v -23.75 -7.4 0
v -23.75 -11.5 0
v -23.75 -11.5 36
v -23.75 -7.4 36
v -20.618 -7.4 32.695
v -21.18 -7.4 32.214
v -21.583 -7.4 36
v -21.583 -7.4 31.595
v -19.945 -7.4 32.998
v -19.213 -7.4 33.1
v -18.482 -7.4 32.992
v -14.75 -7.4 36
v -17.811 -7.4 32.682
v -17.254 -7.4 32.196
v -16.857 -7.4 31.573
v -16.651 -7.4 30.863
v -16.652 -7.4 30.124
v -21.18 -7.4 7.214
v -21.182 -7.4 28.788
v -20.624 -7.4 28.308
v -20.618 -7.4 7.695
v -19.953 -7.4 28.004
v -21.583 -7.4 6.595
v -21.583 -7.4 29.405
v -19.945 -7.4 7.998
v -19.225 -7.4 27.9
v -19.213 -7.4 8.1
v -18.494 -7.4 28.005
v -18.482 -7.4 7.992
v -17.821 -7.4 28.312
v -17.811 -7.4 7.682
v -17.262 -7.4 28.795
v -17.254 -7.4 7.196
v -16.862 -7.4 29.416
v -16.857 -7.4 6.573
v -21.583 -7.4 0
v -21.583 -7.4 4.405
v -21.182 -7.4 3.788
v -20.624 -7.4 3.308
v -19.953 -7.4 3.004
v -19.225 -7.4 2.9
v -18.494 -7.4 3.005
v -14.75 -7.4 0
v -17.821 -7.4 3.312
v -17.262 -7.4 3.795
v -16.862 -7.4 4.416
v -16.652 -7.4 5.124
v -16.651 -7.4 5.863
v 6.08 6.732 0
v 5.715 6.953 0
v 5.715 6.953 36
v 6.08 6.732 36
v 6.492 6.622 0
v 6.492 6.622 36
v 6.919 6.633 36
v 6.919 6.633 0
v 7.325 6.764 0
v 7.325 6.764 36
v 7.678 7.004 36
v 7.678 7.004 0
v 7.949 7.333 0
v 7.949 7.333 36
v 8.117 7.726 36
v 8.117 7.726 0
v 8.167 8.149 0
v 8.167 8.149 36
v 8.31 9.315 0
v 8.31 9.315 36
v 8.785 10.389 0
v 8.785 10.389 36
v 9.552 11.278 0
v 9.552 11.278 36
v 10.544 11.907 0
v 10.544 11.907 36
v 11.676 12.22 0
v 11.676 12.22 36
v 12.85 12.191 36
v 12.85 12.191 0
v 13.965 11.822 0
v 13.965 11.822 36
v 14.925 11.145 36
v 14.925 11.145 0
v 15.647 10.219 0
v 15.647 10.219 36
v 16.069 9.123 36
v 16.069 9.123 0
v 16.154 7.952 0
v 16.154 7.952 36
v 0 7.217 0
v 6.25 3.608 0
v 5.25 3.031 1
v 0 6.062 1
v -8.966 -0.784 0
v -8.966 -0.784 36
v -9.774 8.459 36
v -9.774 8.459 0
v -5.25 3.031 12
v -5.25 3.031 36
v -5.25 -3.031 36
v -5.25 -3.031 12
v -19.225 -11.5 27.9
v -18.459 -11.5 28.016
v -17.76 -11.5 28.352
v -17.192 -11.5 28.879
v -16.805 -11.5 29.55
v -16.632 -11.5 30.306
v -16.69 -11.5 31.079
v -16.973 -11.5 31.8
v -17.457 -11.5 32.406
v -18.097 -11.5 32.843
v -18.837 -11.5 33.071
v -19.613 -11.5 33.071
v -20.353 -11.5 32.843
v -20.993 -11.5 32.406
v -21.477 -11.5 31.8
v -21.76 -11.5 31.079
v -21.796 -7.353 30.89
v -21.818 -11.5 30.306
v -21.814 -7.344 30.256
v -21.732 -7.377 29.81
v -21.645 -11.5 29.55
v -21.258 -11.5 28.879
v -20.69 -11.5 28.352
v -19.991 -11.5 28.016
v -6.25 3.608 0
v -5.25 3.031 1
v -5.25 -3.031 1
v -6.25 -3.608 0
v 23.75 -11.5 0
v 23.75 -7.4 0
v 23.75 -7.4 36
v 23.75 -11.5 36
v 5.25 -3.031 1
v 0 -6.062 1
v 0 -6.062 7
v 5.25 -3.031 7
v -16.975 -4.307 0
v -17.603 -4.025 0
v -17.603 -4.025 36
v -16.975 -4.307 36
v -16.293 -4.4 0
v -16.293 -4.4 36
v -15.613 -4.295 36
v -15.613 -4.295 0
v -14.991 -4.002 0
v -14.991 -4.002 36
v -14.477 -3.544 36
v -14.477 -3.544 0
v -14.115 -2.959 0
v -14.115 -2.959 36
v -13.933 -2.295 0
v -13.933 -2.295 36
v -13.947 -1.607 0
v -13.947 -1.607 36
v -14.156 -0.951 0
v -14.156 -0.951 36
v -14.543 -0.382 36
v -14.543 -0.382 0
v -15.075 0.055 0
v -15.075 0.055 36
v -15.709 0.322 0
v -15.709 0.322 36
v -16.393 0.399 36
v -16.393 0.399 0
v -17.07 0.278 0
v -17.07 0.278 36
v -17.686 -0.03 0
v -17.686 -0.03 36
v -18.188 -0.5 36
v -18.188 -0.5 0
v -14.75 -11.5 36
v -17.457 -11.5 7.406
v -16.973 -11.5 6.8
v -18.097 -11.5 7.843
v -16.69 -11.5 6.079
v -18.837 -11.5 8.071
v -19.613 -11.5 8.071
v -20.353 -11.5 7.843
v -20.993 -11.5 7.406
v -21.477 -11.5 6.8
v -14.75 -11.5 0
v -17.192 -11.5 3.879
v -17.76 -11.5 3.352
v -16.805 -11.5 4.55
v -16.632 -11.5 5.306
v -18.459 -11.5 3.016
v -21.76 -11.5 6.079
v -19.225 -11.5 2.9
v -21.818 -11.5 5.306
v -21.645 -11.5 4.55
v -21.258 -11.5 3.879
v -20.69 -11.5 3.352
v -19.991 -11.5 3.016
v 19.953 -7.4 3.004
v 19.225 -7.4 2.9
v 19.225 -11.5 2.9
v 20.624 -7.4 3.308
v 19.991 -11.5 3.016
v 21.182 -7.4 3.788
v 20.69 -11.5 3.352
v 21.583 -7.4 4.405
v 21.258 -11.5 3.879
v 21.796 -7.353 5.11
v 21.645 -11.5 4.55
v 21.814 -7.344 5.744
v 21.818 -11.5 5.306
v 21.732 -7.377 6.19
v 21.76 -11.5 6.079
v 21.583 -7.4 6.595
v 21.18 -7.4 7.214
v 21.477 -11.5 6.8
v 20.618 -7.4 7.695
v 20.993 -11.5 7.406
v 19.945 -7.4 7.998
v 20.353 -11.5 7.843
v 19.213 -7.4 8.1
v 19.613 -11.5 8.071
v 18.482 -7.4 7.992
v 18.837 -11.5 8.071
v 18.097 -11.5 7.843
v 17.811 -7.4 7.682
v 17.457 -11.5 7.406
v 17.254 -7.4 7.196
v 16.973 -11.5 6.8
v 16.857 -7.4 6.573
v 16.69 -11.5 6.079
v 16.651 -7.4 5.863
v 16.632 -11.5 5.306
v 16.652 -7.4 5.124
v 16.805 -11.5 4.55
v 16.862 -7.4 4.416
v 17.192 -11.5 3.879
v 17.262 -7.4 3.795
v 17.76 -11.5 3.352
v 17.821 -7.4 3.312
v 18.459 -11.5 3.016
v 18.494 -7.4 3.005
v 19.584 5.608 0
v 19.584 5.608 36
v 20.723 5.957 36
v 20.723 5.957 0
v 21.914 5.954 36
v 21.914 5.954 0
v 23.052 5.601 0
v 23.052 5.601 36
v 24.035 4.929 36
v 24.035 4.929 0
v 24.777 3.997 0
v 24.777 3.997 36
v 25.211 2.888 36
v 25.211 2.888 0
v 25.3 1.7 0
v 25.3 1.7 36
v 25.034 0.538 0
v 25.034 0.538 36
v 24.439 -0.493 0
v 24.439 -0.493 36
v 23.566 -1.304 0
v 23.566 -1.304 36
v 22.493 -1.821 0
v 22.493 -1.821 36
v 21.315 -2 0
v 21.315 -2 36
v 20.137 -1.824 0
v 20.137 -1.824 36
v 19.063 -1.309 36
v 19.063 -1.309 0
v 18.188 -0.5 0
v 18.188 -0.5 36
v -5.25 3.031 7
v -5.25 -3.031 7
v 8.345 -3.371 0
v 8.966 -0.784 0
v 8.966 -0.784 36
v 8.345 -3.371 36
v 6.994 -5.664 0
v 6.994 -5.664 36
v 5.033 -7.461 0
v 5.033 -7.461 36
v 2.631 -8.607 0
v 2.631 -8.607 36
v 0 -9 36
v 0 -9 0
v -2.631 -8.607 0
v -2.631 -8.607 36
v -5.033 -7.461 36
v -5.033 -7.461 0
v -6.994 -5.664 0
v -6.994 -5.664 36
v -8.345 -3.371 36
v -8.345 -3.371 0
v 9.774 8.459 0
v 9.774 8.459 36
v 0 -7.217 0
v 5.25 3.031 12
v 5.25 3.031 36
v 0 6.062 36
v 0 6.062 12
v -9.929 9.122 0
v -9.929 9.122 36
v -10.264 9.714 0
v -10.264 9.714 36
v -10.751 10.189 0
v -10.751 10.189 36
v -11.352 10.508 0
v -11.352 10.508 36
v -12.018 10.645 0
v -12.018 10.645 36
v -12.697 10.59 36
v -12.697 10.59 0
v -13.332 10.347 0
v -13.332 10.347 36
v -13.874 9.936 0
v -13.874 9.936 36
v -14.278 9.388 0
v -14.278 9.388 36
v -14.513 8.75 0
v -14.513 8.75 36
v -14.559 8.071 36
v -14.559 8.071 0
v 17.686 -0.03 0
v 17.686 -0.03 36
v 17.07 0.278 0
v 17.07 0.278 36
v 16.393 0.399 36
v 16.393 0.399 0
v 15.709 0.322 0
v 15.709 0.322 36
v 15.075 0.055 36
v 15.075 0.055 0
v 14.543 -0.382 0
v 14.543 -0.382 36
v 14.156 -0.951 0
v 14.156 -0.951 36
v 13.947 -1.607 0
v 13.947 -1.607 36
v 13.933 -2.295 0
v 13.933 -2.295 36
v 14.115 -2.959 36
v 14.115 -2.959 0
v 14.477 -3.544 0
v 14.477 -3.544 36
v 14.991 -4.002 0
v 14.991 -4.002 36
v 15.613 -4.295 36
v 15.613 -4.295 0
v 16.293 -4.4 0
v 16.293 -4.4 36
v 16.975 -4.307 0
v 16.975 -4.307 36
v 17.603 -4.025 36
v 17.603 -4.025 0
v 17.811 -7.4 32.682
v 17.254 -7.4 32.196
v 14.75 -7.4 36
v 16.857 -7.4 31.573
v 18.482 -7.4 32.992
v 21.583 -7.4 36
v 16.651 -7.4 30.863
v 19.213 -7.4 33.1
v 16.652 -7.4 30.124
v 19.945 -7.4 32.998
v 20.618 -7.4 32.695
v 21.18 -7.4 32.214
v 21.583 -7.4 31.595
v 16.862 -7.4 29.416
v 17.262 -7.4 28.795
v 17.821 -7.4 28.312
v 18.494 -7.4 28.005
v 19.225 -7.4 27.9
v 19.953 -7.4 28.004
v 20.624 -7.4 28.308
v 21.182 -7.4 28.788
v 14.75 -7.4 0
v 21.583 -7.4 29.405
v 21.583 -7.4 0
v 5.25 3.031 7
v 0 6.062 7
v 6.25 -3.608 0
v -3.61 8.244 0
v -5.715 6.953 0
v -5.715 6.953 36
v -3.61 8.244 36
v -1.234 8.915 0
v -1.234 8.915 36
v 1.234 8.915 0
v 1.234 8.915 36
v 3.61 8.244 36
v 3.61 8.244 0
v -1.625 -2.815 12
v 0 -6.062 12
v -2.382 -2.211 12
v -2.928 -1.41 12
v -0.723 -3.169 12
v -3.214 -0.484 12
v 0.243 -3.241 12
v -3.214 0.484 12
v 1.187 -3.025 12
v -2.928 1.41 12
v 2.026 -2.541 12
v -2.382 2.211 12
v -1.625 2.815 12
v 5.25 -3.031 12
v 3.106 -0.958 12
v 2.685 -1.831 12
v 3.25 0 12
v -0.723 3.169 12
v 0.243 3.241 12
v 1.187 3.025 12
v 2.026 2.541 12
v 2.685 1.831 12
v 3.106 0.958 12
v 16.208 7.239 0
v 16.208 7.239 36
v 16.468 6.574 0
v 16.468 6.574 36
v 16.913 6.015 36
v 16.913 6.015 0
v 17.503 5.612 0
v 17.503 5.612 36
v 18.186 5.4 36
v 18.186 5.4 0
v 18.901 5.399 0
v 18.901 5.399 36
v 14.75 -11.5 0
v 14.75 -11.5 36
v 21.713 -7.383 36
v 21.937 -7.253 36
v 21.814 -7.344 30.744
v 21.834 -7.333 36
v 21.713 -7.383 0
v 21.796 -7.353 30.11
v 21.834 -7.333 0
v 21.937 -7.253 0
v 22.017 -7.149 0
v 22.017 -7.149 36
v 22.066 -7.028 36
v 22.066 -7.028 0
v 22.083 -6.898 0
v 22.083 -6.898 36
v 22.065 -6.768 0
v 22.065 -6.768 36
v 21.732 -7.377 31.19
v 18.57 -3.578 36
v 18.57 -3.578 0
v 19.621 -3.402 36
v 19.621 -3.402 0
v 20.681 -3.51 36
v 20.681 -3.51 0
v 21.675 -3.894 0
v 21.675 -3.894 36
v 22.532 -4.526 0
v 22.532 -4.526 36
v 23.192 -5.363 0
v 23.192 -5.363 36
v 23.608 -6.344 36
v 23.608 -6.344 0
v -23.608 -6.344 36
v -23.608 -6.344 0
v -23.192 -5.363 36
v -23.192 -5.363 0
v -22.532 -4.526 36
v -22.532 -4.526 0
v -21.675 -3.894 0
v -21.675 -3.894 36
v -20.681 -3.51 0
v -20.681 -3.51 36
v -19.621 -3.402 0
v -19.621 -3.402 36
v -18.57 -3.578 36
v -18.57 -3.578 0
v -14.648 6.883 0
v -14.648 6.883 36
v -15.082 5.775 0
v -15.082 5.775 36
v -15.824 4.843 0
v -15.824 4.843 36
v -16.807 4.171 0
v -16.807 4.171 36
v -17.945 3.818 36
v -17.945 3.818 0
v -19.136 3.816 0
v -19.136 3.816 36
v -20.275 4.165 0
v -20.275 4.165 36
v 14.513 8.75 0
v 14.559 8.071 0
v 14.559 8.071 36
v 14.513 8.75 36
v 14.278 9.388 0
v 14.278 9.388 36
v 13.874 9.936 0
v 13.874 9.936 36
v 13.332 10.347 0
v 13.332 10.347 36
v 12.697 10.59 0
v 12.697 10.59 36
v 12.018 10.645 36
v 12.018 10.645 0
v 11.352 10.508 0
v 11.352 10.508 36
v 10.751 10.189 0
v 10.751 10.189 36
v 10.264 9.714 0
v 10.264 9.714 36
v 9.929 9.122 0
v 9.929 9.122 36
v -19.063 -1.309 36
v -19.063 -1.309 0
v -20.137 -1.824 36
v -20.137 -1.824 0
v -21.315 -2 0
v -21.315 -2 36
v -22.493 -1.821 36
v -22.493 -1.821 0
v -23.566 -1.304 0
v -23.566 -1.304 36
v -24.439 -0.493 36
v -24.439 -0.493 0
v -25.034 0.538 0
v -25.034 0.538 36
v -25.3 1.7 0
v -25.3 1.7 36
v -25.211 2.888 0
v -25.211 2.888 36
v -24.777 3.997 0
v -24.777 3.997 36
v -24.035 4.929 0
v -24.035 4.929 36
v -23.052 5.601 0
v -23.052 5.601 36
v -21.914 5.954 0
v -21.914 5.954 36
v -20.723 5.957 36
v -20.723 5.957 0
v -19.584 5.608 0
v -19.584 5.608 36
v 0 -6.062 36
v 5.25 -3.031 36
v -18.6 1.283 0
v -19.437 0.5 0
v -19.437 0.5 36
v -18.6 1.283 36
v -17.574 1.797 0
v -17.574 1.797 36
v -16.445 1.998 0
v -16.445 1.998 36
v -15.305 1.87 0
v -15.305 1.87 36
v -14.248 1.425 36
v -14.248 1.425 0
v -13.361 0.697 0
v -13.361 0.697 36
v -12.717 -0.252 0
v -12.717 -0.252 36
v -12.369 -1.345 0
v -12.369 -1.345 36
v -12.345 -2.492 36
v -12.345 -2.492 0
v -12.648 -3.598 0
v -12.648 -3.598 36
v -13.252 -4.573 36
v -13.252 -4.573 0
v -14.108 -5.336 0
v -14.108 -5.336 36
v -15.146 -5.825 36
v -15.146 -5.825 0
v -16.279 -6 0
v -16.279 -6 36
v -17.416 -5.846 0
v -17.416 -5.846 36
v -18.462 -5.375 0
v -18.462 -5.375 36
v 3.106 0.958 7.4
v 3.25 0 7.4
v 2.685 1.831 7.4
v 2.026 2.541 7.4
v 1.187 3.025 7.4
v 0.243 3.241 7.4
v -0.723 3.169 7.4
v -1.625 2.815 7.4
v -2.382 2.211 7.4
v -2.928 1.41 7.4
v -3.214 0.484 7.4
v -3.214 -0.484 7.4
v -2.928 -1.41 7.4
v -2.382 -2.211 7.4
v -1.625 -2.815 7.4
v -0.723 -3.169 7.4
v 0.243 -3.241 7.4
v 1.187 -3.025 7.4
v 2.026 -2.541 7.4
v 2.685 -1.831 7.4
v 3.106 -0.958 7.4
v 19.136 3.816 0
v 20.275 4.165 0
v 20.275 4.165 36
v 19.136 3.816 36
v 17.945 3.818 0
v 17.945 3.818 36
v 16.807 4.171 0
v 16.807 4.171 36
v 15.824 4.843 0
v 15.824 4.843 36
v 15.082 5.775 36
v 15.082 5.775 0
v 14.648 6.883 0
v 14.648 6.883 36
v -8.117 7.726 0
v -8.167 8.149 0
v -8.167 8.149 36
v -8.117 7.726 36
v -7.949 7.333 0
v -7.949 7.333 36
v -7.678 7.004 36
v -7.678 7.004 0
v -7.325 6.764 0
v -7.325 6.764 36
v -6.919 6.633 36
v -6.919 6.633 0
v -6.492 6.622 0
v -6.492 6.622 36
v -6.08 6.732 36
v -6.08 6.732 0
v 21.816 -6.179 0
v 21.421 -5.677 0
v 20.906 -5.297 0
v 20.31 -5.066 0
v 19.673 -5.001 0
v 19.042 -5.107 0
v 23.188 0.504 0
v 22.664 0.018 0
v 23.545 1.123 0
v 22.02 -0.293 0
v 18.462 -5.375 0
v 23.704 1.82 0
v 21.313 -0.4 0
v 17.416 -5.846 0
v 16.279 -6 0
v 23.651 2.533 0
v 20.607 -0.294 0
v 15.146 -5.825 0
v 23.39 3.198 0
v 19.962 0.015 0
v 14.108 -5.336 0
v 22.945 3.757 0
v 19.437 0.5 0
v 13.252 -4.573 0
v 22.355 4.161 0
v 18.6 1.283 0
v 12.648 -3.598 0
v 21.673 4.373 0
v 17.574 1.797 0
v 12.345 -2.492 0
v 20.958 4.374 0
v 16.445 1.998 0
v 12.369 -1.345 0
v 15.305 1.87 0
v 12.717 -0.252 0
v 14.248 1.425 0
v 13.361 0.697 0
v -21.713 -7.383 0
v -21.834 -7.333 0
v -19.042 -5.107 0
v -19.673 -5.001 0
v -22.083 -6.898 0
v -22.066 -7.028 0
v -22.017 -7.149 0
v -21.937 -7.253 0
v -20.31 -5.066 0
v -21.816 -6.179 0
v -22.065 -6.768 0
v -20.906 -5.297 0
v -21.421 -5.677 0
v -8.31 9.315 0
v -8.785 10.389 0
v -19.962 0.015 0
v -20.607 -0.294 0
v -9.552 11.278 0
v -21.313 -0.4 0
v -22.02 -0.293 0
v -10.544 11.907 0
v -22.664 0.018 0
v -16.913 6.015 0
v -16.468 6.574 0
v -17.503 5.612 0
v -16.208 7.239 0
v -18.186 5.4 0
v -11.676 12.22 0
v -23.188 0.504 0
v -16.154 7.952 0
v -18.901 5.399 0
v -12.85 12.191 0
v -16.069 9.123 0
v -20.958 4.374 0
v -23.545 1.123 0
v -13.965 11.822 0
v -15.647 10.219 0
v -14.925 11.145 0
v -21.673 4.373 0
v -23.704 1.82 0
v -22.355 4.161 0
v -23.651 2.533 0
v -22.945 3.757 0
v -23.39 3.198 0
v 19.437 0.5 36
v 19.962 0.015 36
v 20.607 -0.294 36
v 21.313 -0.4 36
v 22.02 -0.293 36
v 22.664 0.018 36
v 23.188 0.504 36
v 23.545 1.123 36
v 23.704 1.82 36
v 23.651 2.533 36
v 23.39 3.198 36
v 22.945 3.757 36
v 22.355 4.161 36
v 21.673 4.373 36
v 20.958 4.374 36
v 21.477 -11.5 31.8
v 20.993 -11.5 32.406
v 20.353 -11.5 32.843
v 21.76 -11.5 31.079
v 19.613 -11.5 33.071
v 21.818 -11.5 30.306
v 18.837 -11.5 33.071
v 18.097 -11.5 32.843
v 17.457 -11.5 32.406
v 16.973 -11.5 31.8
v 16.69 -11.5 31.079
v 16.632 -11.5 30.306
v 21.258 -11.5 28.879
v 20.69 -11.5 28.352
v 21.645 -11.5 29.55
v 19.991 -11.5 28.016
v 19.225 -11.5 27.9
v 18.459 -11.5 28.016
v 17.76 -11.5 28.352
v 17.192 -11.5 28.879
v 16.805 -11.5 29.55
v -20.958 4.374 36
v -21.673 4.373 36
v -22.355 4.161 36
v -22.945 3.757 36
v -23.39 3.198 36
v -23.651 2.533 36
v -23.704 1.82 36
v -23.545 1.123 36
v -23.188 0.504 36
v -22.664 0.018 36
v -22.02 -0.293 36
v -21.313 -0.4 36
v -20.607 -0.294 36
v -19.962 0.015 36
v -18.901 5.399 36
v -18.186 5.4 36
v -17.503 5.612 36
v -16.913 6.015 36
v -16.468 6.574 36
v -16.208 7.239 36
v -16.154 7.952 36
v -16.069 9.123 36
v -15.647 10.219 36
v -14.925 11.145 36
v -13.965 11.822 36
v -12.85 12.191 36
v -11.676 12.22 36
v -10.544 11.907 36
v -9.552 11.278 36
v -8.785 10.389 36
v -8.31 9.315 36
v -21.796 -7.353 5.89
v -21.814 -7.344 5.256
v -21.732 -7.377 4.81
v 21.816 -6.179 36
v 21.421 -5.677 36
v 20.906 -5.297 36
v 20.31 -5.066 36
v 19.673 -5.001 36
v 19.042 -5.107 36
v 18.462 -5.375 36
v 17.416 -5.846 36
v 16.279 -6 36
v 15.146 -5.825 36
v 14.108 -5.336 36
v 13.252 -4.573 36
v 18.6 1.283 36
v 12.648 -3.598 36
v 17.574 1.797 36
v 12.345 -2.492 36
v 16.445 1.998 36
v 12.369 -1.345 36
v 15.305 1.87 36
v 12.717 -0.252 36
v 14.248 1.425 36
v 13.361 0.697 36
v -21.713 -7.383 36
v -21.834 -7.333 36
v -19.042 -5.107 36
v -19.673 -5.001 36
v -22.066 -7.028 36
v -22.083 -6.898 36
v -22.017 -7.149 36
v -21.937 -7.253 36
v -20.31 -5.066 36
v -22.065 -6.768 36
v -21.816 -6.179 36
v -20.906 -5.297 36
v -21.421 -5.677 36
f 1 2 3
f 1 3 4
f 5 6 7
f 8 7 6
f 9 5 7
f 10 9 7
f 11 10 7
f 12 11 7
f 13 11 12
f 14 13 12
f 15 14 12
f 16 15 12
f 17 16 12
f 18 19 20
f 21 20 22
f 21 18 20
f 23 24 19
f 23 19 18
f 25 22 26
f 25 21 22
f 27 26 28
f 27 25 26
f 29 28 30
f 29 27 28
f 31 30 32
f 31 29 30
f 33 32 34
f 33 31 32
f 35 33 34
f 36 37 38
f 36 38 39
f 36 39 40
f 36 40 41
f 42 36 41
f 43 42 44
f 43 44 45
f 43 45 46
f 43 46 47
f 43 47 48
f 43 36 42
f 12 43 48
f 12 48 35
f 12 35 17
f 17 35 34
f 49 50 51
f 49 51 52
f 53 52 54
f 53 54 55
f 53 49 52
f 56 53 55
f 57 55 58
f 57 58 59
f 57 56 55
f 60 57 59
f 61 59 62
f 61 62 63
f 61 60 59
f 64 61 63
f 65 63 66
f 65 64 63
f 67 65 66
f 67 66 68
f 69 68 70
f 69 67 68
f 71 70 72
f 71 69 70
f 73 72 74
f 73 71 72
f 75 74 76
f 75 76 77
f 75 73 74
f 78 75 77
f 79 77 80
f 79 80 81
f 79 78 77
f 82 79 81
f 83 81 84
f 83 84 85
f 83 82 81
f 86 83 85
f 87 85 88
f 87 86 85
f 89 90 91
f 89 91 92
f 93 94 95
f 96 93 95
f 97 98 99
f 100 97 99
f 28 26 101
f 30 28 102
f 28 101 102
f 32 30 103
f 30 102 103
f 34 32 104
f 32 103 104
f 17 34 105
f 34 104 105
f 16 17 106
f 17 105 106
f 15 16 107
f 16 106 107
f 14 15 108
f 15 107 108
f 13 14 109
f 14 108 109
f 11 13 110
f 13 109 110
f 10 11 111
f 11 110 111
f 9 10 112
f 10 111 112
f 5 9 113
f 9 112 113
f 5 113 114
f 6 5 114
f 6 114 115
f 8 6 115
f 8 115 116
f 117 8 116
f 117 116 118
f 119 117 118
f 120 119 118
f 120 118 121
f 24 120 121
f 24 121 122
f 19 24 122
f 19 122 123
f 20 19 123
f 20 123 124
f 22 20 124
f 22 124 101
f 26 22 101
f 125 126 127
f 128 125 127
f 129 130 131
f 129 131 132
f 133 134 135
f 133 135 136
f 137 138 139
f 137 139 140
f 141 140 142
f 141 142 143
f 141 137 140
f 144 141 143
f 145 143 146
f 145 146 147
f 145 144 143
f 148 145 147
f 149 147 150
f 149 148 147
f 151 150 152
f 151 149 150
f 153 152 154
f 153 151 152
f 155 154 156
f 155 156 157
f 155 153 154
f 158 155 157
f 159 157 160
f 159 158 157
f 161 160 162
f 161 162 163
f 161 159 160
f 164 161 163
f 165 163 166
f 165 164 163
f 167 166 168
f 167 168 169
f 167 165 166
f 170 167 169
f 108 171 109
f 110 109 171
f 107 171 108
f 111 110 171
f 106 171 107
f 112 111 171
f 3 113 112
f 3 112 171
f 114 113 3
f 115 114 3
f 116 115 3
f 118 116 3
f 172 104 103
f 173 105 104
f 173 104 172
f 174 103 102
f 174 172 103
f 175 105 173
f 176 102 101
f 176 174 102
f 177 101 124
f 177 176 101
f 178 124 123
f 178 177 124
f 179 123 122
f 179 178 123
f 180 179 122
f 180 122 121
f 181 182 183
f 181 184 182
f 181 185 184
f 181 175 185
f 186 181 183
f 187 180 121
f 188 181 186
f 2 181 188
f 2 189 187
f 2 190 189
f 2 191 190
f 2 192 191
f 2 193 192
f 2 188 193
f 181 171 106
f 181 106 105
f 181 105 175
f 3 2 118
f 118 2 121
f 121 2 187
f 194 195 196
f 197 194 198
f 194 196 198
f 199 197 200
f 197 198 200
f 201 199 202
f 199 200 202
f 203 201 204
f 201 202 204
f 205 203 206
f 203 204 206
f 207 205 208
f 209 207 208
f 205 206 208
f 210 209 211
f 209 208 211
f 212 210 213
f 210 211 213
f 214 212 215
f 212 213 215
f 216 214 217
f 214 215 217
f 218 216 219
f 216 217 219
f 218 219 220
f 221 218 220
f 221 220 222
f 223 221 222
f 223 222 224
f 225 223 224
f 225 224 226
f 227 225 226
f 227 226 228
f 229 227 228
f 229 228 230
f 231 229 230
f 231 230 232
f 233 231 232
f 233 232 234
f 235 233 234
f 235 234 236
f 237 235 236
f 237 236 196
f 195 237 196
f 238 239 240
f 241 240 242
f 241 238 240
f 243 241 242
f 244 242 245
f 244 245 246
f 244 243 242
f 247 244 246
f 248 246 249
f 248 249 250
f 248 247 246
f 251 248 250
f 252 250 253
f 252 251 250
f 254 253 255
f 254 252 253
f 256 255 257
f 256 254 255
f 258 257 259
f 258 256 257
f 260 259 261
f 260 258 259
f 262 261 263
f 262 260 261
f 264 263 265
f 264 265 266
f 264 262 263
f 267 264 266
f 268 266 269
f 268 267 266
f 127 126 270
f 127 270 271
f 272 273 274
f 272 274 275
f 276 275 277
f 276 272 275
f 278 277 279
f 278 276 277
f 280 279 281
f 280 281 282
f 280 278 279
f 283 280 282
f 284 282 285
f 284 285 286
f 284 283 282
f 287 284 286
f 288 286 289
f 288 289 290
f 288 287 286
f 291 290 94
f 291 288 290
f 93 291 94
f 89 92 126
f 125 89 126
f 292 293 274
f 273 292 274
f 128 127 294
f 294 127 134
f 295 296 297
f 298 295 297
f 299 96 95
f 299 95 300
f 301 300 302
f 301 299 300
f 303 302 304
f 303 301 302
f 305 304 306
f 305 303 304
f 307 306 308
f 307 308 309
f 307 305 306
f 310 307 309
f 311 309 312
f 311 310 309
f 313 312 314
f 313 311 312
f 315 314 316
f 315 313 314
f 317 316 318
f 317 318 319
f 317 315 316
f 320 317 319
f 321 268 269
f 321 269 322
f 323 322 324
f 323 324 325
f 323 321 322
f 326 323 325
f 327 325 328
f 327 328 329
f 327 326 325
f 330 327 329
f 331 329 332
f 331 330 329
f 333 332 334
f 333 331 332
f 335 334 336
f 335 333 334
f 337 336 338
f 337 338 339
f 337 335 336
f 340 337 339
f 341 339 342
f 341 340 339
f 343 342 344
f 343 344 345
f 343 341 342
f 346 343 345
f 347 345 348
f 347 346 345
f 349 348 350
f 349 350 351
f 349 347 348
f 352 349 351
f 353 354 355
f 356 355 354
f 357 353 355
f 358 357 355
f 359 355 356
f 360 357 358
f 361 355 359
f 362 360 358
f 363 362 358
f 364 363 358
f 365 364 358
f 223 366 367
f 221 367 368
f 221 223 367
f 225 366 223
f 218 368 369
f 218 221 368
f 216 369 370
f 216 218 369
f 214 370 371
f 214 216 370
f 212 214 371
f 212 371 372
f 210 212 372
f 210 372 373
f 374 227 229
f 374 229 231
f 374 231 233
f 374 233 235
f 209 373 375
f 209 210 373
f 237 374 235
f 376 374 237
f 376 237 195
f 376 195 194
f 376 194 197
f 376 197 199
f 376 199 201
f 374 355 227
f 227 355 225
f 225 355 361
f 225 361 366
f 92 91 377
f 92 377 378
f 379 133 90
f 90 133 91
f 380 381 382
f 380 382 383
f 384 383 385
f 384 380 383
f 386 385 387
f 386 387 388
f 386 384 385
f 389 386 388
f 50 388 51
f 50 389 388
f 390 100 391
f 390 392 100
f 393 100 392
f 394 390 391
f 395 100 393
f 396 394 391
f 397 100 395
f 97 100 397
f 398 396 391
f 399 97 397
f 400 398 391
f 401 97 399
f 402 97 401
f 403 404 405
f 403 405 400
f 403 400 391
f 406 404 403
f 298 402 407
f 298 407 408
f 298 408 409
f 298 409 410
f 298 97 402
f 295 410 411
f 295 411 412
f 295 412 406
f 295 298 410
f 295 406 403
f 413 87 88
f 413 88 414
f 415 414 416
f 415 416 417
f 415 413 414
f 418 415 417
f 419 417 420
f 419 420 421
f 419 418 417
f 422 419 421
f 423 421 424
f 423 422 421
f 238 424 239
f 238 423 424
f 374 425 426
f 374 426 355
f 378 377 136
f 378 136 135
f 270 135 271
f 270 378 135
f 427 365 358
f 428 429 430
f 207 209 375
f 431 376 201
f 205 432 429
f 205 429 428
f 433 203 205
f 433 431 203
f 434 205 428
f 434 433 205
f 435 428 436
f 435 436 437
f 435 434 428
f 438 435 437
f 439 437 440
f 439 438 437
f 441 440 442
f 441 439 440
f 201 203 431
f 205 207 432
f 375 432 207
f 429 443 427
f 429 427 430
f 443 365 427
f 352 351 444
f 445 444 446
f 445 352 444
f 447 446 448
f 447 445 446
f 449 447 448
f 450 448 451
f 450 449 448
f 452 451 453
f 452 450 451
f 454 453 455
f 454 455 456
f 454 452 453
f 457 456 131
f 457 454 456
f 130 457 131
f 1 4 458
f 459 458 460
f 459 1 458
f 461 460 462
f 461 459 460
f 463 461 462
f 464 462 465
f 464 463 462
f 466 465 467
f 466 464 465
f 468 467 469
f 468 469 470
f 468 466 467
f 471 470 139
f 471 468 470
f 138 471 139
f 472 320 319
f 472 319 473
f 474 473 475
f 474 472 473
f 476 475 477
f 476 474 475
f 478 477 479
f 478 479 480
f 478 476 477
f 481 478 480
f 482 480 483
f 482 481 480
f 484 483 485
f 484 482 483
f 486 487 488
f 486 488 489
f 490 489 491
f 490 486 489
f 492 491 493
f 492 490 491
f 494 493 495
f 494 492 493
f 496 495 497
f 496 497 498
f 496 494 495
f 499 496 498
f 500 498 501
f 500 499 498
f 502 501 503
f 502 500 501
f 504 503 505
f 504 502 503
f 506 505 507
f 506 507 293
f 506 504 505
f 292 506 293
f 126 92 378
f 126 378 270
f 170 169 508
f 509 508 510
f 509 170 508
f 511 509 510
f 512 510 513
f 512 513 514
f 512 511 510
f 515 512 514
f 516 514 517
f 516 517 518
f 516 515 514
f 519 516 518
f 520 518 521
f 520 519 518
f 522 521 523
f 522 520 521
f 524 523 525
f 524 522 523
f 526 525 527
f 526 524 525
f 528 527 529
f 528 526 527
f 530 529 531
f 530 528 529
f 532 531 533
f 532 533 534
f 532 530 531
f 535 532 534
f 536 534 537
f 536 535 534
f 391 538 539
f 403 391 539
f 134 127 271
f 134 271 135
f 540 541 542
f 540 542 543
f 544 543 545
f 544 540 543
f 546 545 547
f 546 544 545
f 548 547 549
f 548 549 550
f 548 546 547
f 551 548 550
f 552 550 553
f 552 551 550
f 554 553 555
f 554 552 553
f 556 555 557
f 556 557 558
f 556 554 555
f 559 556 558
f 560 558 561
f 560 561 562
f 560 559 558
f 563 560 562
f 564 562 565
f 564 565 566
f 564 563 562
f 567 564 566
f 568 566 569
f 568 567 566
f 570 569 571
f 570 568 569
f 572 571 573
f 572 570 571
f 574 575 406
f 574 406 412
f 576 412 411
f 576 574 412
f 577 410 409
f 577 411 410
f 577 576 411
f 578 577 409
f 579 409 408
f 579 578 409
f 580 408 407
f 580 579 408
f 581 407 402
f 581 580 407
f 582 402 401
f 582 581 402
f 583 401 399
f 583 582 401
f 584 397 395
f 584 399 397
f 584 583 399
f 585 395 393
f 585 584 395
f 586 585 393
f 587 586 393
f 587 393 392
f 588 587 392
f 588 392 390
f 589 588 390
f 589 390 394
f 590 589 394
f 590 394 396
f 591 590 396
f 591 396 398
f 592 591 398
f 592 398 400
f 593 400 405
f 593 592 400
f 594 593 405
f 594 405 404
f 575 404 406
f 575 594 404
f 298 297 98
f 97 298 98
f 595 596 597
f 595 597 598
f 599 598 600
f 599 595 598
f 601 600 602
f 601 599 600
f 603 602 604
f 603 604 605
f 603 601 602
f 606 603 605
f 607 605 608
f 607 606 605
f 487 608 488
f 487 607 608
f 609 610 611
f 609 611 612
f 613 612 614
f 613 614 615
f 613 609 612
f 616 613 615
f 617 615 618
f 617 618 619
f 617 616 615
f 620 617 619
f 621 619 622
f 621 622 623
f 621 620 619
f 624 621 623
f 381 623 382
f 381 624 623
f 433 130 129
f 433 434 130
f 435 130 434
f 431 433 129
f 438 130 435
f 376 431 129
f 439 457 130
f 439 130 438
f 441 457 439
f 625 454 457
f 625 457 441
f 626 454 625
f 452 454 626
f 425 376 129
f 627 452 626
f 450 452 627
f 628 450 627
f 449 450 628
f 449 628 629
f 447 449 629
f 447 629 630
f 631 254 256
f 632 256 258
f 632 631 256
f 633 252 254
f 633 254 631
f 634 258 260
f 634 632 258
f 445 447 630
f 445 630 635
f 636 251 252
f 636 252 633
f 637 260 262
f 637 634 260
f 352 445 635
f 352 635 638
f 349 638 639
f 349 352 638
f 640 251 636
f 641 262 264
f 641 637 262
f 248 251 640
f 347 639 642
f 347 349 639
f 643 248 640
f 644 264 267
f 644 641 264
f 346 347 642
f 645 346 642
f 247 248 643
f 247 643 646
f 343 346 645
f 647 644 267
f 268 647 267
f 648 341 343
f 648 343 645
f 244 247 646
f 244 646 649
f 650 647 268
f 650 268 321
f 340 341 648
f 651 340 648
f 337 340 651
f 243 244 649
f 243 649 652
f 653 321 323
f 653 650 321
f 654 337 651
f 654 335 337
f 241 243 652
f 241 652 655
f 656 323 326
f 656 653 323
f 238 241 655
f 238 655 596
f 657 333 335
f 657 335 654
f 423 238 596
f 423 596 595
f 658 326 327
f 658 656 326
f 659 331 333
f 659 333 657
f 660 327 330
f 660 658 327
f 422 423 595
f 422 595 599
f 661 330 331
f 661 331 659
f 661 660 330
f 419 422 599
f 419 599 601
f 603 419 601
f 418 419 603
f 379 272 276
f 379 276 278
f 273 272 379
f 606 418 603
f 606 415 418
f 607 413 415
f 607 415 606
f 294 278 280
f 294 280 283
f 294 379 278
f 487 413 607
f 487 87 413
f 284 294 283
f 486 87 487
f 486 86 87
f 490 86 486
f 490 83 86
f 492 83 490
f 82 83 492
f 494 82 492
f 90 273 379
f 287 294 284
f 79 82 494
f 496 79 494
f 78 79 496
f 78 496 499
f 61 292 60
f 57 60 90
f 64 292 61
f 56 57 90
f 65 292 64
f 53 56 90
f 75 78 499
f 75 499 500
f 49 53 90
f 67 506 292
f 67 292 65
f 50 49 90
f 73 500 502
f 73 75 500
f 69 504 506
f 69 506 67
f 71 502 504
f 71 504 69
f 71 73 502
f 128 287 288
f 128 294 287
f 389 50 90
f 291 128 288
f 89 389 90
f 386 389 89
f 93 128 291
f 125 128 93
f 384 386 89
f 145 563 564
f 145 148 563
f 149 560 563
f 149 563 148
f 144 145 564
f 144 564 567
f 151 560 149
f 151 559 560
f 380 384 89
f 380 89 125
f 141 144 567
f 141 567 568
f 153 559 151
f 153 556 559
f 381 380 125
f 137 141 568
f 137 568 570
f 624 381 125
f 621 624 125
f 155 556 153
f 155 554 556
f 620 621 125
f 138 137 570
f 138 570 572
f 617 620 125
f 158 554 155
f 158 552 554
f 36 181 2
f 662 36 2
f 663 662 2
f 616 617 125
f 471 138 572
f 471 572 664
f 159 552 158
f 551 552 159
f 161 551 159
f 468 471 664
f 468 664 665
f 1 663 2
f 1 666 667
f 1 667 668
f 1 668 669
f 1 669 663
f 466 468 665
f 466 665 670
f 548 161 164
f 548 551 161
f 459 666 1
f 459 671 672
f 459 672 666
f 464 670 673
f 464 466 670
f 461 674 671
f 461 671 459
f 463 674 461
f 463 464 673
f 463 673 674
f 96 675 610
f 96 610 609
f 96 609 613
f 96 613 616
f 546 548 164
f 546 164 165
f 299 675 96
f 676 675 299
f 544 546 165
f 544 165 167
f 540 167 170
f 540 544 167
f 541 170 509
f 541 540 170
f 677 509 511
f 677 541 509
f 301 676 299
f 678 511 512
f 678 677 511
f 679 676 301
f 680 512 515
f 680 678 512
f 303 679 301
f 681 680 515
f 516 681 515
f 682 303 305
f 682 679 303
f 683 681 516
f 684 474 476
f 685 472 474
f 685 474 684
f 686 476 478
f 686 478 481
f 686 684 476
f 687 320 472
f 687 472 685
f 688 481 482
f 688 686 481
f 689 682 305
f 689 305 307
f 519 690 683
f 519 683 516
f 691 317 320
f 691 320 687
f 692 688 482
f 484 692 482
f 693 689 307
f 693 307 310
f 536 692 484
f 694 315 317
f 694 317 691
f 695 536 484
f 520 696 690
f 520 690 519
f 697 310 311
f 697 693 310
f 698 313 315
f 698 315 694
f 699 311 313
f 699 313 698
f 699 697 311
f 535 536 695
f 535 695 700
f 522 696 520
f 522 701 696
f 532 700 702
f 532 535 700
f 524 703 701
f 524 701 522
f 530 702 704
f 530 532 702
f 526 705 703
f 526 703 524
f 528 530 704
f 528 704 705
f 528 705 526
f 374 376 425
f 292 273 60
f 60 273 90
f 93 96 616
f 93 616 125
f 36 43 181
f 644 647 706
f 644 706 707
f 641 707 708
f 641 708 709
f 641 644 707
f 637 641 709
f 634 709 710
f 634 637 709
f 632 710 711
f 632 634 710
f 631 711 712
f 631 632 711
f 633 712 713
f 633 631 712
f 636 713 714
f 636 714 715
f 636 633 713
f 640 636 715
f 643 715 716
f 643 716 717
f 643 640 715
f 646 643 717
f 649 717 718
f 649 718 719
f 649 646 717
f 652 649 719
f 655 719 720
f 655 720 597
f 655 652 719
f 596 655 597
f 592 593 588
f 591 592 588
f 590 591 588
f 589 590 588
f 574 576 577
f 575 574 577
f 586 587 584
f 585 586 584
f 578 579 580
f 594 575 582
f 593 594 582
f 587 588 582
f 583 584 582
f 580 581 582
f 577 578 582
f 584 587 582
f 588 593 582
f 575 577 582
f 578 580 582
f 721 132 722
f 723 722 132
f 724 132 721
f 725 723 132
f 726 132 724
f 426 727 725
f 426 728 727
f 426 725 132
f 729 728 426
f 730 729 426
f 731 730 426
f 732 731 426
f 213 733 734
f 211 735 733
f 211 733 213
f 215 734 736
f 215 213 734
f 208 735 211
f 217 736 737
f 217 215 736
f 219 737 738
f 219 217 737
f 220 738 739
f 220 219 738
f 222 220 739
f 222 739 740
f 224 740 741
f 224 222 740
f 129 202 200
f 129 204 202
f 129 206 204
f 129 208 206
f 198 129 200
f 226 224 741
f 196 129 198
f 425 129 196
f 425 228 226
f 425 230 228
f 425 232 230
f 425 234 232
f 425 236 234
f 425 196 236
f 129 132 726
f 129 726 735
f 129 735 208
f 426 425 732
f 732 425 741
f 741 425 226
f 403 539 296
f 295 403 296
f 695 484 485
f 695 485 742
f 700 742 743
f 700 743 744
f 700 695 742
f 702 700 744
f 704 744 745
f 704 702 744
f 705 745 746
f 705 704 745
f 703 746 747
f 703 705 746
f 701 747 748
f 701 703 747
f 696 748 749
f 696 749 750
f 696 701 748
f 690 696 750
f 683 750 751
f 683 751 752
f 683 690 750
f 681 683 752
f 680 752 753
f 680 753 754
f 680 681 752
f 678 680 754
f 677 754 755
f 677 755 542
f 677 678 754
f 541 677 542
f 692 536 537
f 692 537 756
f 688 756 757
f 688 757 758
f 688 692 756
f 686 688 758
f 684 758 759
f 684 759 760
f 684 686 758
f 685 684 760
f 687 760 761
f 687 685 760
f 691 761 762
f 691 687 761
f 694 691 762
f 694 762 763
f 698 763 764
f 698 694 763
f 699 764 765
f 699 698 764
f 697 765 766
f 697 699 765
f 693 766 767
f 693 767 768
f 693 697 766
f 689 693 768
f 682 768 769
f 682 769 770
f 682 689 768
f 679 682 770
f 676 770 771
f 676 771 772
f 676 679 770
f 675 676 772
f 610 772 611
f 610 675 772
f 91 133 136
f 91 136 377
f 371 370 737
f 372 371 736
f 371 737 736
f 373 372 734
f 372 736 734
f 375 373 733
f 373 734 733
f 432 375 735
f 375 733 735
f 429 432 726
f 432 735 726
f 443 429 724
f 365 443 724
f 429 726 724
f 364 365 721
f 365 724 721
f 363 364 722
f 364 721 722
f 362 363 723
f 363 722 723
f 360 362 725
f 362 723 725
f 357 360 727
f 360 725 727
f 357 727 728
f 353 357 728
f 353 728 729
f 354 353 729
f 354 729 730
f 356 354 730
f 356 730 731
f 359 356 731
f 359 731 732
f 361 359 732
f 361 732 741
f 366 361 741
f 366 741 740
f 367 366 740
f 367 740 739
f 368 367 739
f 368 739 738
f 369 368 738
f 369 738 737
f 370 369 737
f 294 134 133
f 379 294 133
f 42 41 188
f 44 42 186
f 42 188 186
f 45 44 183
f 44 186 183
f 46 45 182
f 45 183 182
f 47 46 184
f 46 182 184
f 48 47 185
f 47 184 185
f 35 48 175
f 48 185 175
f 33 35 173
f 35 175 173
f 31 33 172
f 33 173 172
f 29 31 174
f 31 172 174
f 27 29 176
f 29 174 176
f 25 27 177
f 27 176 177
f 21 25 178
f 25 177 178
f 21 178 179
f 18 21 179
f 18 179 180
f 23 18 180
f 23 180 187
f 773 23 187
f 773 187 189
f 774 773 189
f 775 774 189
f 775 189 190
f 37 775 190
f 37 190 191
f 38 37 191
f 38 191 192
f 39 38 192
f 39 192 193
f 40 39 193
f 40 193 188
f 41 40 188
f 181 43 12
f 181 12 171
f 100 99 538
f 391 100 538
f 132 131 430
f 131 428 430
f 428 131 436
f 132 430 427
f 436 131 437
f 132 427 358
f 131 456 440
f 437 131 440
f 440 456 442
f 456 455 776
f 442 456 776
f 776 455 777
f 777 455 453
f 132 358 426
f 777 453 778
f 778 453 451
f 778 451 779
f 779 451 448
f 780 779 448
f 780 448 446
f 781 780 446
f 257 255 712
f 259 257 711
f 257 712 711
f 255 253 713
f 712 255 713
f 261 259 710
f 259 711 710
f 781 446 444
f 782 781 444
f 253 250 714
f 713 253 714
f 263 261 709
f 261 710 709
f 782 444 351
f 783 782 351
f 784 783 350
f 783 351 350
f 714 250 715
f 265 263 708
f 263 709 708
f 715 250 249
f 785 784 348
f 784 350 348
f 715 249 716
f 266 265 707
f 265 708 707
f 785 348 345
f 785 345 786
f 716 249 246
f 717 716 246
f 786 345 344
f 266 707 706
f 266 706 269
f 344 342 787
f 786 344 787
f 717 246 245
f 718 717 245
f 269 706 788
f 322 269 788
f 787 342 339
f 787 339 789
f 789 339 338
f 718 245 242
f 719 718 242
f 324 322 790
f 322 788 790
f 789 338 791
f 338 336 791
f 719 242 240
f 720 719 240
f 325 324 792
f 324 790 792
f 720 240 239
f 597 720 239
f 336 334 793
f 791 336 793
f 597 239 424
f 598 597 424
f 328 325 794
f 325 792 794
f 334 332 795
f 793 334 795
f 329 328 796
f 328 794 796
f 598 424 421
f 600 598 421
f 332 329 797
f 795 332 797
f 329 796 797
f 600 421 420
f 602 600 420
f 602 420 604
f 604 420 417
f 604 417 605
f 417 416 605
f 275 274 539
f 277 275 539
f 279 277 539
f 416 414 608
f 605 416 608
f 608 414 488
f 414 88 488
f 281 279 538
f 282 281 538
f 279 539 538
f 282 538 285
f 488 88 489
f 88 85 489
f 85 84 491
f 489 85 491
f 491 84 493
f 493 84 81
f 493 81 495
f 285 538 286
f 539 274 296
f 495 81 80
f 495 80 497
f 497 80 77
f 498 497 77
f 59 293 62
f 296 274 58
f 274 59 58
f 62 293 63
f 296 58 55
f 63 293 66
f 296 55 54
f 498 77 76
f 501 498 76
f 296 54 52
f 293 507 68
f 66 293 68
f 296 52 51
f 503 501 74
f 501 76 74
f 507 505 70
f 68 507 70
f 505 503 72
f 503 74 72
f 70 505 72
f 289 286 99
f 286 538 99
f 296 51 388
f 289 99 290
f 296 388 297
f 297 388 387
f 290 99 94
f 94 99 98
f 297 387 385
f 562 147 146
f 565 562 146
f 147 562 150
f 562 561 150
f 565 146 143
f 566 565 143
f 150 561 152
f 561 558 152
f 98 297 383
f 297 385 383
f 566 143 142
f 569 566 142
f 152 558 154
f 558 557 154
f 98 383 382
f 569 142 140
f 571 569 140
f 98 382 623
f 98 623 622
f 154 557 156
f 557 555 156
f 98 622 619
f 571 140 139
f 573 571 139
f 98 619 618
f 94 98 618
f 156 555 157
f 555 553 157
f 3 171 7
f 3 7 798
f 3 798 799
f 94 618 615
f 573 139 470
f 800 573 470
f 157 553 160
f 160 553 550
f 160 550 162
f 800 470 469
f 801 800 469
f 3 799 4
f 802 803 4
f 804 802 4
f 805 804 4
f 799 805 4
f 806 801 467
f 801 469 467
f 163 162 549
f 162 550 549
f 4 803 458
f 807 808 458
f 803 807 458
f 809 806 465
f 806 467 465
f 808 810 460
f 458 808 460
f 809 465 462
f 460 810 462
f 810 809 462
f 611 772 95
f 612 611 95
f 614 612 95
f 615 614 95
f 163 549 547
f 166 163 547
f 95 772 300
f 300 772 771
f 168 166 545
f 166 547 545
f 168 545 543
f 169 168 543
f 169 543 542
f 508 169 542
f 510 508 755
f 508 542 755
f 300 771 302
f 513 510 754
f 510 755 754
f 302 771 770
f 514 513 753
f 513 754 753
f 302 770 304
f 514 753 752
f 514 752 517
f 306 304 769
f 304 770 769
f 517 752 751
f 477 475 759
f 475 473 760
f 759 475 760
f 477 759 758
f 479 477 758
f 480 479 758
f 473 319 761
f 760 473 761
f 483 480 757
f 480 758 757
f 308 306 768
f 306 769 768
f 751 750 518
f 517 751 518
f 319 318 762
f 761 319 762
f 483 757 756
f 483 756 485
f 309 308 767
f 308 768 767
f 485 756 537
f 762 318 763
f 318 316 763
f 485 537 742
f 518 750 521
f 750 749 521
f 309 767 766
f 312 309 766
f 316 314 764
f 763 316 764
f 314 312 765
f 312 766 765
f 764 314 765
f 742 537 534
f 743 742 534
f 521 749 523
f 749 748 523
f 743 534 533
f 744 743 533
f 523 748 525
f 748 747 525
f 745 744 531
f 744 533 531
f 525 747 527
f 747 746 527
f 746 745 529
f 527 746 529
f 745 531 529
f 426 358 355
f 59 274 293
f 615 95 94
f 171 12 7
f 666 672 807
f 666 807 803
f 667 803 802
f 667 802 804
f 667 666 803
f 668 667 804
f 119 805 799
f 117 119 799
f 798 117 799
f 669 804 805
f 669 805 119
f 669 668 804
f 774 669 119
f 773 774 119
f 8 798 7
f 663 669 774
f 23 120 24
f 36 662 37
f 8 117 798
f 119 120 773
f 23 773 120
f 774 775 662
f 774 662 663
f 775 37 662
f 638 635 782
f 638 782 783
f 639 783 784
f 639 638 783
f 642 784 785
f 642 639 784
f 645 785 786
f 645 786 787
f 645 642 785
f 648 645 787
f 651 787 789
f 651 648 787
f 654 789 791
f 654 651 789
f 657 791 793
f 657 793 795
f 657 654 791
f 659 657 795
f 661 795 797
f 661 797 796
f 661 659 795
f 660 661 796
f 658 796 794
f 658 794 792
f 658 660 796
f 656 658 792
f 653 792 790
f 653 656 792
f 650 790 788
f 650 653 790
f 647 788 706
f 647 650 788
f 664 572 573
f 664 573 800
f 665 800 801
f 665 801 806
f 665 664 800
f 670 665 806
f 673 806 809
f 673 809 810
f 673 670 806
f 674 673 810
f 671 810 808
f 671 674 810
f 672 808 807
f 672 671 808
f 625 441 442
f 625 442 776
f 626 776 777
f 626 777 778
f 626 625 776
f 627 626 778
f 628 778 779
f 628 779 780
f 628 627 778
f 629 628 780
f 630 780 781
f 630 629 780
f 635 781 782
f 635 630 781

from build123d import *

# Parameters (mm, degrees)
SKETCH1_R           = 3.25
BOSS_EXTRUDE1_DEPTH = 36
SKETCH2_R           = 2.6
CUT_EXTRUDE1_DEPTH  = 4.2
CUT_EXTRUDE3_DEPTH  = 7
CUT_EXTRUDE2_DEPTH  = 24
SKETCH6_R           = 3.25
BOSS_EXTRUDE2_DEPTH = 0.4
CHAMFER1_SIZE       = 1


with BuildPart() as part:
    # Sketch1 → Boss-Extrude1 (new body)
    with BuildSketch(Plane.XY):
        with BuildLine():
            Line((-14.75, -7.4), (-14.75, -11.5))
            Line((-14.75, -11.5), (-23.75, -11.5))
            Line((-23.75, -11.5), (-23.75, -7.4))
            ThreePointArc((-23.75, -7.4), (-21.675125708, -3.893735462), (-17.603054495, -4.025))
            ThreePointArc((-17.603054495, -4.025), (-13.947306078, -1.606859229), (-18.188386592, -0.5))
            ThreePointArc((-18.188386592, -0.5), (-25.210418213, 1.109132257), (-19.583771133, 5.607918465))
            ThreePointArc((-19.583771133, 5.607918465), (-17.193366172, 5.79117644), (-16.154186894, 7.951668465))
            ThreePointArc((-16.154186894, 7.951668465), (-12.264338175, 12.248774426), (-8.166591783, 8.149443113))
            ThreePointArc((-8.166591783, 8.149443113), (-7.324900269, 6.763678693), (-5.714627865, 6.952915098))
            ThreePointArc((-5.714627865, 6.952915098), (0, 9), (5.714627865, 6.952915098))
            ThreePointArc((5.714627865, 6.952915098), (7.324900269, 6.763678693), (8.166591783, 8.149443113))
            ThreePointArc((8.166591783, 8.149443113), (12.264338175, 12.248774426), (16.154186894, 7.951668465))
            ThreePointArc((16.154186894, 7.951668465), (17.193366172, 5.79117644), (19.583771133, 5.607918465))
            ThreePointArc((19.583771133, 5.607918465), (25.210418213, 1.109132257), (18.188386592, -0.5))
            ThreePointArc((18.188386592, -0.5), (13.947306078, -1.606859229), (17.603054495, -4.025))
            ThreePointArc((17.603054495, -4.025), (21.675125708, -3.893735462), (23.75, -7.4))
            Line((23.75, -7.4), (23.75, -11.5))
            Line((23.75, -11.5), (14.75, -11.5))
            Line((14.75, -11.5), (14.75, -7.4))
            Line((14.75, -7.4), (21.583030278, -7.4))
            ThreePointArc((21.583030278, -7.4), (21.980389985, -7.203488489), (22.065406667, -6.768421053))
            ThreePointArc((22.065406667, -6.768421053), (20.615569602, -5.16152077), (18.461832697, -5.375))
            ThreePointArc((18.461832697, -5.375), (12.368918668, -1.344765382), (19.437386192, 0.5))
            ThreePointArc((19.437386192, 0.5), (23.650605164, 1.465479354), (20.274616916, 4.164751079))
            ThreePointArc((20.274616916, 4.164751079), (16.290608649, 4.470181037), (14.558643186, 8.071001079))
            ThreePointArc((14.558643186, 8.071001079), (12.359417834, 10.642138999), (9.774460347, 8.459173783))
            Line((9.774460347, 8.459173783), (8.965752283, -0.784401685))
            ThreePointArc((8.965752283, -0.784401685), (0, -9), (-8.965752283, -0.784401685))
            Line((-8.965752283, -0.784401685), (-9.774460347, 8.459173783))
            ThreePointArc((-9.774460347, 8.459173783), (-12.359417834, 10.642138999), (-14.558643186, 8.071001079))
            ThreePointArc((-14.558643186, 8.071001079), (-16.290608649, 4.470181037), (-20.274616916, 4.164751079))
            ThreePointArc((-20.274616916, 4.164751079), (-23.650605164, 1.465479354), (-19.437386192, 0.5))
            ThreePointArc((-19.437386192, 0.5), (-12.368918668, -1.344765382), (-18.461832697, -5.375))
            ThreePointArc((-18.461832697, -5.375), (-20.615569602, -5.16152077), (-22.065406667, -6.768421053))
            ThreePointArc((-22.065406667, -6.768421053), (-21.980389985, -7.203488489), (-21.583030278, -7.4))
            Line((-21.583030278, -7.4), (-14.75, -7.4))
        make_face()
        Circle(SKETCH1_R, mode=Mode.SUBTRACT)
    extrude(amount=BOSS_EXTRUDE1_DEPTH)

    # Sketch2 → Cut-Extrude1 (cut)
    with BuildSketch(Plane.XZ.offset(11.5)):
        with Locations(Location((-19.225, 30.5, 0), (0, 0, 270))):  # turned: the seam where the file's is
            Circle(SKETCH2_R)
        with Locations(Location((-19.225, 5.5, 0), (0, 0, 270))):  # turned: the seam where the file's is
            Circle(SKETCH2_R)
        with Locations(Location((19.225, 5.5, 0), (0, 0, 270))):  # turned: the seam where the file's is
            Circle(SKETCH2_R)
        with Locations(Location((19.225, 30.5, 0), (0, 0, 270))):  # turned: the seam where the file's is
            Circle(SKETCH2_R)
    extrude(amount=-CUT_EXTRUDE1_DEPTH, mode=Mode.SUBTRACT)

    # Sketch5 → Cut-Extrude3 (cut)
    with BuildSketch(Plane.XY):
        Polygon((5.25, -3.031088913), (5.25, 3.031088913), (0, 6.062177826), (-5.25, 3.031088913), (-5.25, -3.031088913), (0, -6.062177826), align=None)
    extrude(amount=CUT_EXTRUDE3_DEPTH, mode=Mode.SUBTRACT)

    # Sketch3 → Cut-Extrude2 (cut)
    with BuildSketch(Plane.XY.offset(36)):
        Polygon((5.25, -3.031088913), (5.25, 3.031088913), (0, 6.062177826), (-5.25, 3.031088913), (-5.25, -3.031088913), (0, -6.062177826), align=None)
    extrude(amount=-CUT_EXTRUDE2_DEPTH, mode=Mode.SUBTRACT)

    # Sketch6 → Boss-Extrude2 (add)
    with BuildSketch(Plane(origin=(0, 0, 7), x_dir=(-1, 0, 0), z_dir=(0, 0, -1))):
        Circle(SKETCH6_R)
    extrude(amount=-BOSS_EXTRUDE2_DEPTH)

    # Chamfer1
    chamfer1_edges = [part.edges().sort_by_distance(p)[0] for p in [
        (2.625, -4.54663337, 0),
        (5.25, 0, 0),
        (2.625, 4.54663337, 0),
        (-2.625, 4.54663337, 0),
        (-5.25, 0, 0),
        (-2.625, -4.54663337, 0),
    ]]
    chamfer(chamfer1_edges, length=CHAMFER1_SIZE)


solid = part.part
